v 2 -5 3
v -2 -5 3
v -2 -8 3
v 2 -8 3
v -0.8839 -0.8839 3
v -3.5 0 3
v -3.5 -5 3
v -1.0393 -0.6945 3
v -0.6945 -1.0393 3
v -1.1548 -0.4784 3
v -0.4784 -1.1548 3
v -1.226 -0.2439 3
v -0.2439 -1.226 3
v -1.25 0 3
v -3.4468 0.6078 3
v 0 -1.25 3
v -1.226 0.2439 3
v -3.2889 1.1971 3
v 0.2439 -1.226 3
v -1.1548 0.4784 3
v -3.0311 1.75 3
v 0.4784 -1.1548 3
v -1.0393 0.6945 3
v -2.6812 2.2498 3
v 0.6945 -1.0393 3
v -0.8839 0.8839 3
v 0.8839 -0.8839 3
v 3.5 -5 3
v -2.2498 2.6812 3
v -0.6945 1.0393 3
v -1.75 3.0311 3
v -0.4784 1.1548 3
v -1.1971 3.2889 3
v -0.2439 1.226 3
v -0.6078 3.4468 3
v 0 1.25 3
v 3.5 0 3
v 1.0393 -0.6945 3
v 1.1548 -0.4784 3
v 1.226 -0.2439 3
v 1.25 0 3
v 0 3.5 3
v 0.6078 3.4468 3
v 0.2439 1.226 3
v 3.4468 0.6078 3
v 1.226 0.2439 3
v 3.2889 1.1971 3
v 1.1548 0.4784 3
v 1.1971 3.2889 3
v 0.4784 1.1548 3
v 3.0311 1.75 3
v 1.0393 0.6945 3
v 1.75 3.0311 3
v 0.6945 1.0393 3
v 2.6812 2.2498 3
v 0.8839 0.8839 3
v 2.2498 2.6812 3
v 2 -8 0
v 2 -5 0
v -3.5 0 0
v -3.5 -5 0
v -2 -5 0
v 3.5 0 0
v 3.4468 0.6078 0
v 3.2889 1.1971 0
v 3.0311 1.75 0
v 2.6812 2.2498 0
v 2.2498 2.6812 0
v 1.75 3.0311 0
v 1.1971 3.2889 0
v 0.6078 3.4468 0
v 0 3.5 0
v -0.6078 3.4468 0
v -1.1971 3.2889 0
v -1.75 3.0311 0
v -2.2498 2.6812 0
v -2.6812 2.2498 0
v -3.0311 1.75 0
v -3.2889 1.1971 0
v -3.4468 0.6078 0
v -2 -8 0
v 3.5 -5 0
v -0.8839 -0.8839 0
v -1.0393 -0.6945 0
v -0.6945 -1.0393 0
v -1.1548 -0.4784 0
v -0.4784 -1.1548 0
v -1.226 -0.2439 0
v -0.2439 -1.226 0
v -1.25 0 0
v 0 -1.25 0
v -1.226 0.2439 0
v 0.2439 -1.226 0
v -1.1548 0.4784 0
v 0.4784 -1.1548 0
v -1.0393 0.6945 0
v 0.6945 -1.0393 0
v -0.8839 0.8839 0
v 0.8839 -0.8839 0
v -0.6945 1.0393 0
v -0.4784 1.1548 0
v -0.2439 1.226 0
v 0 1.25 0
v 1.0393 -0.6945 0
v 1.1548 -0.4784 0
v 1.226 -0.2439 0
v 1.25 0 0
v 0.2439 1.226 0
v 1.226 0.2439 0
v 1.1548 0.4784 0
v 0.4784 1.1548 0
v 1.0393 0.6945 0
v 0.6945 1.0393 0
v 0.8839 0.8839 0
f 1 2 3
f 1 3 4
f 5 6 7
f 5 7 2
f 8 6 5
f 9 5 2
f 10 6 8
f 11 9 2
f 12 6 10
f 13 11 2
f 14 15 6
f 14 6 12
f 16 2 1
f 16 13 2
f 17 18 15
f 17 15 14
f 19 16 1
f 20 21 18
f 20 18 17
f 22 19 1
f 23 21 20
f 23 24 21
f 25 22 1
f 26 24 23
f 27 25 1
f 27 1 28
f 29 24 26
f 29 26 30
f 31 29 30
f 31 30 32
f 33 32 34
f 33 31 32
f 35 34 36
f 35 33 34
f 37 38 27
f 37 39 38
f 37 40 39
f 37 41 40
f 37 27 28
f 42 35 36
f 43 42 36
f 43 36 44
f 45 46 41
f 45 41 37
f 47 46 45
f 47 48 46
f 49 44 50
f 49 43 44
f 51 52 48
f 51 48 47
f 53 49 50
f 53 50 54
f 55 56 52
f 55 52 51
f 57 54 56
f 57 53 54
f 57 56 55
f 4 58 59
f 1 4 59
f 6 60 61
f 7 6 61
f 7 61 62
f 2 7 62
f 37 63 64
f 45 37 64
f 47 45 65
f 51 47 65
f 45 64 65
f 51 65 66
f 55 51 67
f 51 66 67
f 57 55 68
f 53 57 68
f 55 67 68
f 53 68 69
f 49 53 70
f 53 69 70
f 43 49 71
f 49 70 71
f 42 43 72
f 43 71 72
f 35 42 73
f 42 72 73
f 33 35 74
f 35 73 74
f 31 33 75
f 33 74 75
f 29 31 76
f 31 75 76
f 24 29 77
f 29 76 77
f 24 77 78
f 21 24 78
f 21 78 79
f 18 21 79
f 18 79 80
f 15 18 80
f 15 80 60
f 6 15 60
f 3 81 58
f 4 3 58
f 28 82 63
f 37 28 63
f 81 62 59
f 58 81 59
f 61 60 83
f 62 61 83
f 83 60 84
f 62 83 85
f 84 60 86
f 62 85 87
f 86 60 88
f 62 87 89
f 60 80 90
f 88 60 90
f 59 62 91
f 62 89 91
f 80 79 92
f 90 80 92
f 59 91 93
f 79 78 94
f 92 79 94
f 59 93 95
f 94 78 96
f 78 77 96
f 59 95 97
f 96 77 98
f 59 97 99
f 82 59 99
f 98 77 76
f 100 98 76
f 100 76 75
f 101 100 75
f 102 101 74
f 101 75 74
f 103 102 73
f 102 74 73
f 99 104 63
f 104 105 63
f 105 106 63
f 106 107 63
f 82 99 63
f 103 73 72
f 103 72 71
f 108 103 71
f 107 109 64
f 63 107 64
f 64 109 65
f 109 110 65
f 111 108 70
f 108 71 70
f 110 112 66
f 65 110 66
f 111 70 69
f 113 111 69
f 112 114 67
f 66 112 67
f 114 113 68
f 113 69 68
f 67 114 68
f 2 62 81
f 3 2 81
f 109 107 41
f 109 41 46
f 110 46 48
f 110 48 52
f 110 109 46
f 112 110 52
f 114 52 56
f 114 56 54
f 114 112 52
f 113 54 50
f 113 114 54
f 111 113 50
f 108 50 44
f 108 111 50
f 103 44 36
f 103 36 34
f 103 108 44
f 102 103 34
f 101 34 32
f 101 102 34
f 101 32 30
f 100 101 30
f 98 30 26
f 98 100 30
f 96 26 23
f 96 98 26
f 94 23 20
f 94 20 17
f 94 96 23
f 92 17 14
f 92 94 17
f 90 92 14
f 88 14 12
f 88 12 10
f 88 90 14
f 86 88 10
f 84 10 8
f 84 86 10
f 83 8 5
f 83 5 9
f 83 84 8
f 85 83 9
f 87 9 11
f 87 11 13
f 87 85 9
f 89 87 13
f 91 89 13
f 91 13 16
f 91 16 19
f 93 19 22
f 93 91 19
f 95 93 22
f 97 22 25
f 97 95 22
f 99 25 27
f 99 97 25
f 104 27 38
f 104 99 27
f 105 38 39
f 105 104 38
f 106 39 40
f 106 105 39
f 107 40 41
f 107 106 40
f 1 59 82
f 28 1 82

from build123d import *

# Parameters (mm, degrees)
SKETCH1_R           = 1.25
BOSS_EXTRUDE1_DEPTH = 3


with BuildPart() as part:
    # Sketch1 → Boss-Extrude1 (new body)
    with BuildSketch(Plane.XY):
        with BuildLine():
            Line((-3.5, 0), (-3.5, -5))
            Line((-3.5, -5), (-2, -5))
            Line((-2, -5), (-2, -8))
            Line((-2, -8), (2, -8))
            Line((2, -8), (2, -5))
            Line((2, -5), (3.5, -5))
            Line((3.5, -5), (3.5, 0))
            ThreePointArc((3.5, 0), (0, 3.5), (-3.5, 0))
        make_face()
        Circle(SKETCH1_R, mode=Mode.SUBTRACT)
    extrude(amount=BOSS_EXTRUDE1_DEPTH)


solid = part.part
